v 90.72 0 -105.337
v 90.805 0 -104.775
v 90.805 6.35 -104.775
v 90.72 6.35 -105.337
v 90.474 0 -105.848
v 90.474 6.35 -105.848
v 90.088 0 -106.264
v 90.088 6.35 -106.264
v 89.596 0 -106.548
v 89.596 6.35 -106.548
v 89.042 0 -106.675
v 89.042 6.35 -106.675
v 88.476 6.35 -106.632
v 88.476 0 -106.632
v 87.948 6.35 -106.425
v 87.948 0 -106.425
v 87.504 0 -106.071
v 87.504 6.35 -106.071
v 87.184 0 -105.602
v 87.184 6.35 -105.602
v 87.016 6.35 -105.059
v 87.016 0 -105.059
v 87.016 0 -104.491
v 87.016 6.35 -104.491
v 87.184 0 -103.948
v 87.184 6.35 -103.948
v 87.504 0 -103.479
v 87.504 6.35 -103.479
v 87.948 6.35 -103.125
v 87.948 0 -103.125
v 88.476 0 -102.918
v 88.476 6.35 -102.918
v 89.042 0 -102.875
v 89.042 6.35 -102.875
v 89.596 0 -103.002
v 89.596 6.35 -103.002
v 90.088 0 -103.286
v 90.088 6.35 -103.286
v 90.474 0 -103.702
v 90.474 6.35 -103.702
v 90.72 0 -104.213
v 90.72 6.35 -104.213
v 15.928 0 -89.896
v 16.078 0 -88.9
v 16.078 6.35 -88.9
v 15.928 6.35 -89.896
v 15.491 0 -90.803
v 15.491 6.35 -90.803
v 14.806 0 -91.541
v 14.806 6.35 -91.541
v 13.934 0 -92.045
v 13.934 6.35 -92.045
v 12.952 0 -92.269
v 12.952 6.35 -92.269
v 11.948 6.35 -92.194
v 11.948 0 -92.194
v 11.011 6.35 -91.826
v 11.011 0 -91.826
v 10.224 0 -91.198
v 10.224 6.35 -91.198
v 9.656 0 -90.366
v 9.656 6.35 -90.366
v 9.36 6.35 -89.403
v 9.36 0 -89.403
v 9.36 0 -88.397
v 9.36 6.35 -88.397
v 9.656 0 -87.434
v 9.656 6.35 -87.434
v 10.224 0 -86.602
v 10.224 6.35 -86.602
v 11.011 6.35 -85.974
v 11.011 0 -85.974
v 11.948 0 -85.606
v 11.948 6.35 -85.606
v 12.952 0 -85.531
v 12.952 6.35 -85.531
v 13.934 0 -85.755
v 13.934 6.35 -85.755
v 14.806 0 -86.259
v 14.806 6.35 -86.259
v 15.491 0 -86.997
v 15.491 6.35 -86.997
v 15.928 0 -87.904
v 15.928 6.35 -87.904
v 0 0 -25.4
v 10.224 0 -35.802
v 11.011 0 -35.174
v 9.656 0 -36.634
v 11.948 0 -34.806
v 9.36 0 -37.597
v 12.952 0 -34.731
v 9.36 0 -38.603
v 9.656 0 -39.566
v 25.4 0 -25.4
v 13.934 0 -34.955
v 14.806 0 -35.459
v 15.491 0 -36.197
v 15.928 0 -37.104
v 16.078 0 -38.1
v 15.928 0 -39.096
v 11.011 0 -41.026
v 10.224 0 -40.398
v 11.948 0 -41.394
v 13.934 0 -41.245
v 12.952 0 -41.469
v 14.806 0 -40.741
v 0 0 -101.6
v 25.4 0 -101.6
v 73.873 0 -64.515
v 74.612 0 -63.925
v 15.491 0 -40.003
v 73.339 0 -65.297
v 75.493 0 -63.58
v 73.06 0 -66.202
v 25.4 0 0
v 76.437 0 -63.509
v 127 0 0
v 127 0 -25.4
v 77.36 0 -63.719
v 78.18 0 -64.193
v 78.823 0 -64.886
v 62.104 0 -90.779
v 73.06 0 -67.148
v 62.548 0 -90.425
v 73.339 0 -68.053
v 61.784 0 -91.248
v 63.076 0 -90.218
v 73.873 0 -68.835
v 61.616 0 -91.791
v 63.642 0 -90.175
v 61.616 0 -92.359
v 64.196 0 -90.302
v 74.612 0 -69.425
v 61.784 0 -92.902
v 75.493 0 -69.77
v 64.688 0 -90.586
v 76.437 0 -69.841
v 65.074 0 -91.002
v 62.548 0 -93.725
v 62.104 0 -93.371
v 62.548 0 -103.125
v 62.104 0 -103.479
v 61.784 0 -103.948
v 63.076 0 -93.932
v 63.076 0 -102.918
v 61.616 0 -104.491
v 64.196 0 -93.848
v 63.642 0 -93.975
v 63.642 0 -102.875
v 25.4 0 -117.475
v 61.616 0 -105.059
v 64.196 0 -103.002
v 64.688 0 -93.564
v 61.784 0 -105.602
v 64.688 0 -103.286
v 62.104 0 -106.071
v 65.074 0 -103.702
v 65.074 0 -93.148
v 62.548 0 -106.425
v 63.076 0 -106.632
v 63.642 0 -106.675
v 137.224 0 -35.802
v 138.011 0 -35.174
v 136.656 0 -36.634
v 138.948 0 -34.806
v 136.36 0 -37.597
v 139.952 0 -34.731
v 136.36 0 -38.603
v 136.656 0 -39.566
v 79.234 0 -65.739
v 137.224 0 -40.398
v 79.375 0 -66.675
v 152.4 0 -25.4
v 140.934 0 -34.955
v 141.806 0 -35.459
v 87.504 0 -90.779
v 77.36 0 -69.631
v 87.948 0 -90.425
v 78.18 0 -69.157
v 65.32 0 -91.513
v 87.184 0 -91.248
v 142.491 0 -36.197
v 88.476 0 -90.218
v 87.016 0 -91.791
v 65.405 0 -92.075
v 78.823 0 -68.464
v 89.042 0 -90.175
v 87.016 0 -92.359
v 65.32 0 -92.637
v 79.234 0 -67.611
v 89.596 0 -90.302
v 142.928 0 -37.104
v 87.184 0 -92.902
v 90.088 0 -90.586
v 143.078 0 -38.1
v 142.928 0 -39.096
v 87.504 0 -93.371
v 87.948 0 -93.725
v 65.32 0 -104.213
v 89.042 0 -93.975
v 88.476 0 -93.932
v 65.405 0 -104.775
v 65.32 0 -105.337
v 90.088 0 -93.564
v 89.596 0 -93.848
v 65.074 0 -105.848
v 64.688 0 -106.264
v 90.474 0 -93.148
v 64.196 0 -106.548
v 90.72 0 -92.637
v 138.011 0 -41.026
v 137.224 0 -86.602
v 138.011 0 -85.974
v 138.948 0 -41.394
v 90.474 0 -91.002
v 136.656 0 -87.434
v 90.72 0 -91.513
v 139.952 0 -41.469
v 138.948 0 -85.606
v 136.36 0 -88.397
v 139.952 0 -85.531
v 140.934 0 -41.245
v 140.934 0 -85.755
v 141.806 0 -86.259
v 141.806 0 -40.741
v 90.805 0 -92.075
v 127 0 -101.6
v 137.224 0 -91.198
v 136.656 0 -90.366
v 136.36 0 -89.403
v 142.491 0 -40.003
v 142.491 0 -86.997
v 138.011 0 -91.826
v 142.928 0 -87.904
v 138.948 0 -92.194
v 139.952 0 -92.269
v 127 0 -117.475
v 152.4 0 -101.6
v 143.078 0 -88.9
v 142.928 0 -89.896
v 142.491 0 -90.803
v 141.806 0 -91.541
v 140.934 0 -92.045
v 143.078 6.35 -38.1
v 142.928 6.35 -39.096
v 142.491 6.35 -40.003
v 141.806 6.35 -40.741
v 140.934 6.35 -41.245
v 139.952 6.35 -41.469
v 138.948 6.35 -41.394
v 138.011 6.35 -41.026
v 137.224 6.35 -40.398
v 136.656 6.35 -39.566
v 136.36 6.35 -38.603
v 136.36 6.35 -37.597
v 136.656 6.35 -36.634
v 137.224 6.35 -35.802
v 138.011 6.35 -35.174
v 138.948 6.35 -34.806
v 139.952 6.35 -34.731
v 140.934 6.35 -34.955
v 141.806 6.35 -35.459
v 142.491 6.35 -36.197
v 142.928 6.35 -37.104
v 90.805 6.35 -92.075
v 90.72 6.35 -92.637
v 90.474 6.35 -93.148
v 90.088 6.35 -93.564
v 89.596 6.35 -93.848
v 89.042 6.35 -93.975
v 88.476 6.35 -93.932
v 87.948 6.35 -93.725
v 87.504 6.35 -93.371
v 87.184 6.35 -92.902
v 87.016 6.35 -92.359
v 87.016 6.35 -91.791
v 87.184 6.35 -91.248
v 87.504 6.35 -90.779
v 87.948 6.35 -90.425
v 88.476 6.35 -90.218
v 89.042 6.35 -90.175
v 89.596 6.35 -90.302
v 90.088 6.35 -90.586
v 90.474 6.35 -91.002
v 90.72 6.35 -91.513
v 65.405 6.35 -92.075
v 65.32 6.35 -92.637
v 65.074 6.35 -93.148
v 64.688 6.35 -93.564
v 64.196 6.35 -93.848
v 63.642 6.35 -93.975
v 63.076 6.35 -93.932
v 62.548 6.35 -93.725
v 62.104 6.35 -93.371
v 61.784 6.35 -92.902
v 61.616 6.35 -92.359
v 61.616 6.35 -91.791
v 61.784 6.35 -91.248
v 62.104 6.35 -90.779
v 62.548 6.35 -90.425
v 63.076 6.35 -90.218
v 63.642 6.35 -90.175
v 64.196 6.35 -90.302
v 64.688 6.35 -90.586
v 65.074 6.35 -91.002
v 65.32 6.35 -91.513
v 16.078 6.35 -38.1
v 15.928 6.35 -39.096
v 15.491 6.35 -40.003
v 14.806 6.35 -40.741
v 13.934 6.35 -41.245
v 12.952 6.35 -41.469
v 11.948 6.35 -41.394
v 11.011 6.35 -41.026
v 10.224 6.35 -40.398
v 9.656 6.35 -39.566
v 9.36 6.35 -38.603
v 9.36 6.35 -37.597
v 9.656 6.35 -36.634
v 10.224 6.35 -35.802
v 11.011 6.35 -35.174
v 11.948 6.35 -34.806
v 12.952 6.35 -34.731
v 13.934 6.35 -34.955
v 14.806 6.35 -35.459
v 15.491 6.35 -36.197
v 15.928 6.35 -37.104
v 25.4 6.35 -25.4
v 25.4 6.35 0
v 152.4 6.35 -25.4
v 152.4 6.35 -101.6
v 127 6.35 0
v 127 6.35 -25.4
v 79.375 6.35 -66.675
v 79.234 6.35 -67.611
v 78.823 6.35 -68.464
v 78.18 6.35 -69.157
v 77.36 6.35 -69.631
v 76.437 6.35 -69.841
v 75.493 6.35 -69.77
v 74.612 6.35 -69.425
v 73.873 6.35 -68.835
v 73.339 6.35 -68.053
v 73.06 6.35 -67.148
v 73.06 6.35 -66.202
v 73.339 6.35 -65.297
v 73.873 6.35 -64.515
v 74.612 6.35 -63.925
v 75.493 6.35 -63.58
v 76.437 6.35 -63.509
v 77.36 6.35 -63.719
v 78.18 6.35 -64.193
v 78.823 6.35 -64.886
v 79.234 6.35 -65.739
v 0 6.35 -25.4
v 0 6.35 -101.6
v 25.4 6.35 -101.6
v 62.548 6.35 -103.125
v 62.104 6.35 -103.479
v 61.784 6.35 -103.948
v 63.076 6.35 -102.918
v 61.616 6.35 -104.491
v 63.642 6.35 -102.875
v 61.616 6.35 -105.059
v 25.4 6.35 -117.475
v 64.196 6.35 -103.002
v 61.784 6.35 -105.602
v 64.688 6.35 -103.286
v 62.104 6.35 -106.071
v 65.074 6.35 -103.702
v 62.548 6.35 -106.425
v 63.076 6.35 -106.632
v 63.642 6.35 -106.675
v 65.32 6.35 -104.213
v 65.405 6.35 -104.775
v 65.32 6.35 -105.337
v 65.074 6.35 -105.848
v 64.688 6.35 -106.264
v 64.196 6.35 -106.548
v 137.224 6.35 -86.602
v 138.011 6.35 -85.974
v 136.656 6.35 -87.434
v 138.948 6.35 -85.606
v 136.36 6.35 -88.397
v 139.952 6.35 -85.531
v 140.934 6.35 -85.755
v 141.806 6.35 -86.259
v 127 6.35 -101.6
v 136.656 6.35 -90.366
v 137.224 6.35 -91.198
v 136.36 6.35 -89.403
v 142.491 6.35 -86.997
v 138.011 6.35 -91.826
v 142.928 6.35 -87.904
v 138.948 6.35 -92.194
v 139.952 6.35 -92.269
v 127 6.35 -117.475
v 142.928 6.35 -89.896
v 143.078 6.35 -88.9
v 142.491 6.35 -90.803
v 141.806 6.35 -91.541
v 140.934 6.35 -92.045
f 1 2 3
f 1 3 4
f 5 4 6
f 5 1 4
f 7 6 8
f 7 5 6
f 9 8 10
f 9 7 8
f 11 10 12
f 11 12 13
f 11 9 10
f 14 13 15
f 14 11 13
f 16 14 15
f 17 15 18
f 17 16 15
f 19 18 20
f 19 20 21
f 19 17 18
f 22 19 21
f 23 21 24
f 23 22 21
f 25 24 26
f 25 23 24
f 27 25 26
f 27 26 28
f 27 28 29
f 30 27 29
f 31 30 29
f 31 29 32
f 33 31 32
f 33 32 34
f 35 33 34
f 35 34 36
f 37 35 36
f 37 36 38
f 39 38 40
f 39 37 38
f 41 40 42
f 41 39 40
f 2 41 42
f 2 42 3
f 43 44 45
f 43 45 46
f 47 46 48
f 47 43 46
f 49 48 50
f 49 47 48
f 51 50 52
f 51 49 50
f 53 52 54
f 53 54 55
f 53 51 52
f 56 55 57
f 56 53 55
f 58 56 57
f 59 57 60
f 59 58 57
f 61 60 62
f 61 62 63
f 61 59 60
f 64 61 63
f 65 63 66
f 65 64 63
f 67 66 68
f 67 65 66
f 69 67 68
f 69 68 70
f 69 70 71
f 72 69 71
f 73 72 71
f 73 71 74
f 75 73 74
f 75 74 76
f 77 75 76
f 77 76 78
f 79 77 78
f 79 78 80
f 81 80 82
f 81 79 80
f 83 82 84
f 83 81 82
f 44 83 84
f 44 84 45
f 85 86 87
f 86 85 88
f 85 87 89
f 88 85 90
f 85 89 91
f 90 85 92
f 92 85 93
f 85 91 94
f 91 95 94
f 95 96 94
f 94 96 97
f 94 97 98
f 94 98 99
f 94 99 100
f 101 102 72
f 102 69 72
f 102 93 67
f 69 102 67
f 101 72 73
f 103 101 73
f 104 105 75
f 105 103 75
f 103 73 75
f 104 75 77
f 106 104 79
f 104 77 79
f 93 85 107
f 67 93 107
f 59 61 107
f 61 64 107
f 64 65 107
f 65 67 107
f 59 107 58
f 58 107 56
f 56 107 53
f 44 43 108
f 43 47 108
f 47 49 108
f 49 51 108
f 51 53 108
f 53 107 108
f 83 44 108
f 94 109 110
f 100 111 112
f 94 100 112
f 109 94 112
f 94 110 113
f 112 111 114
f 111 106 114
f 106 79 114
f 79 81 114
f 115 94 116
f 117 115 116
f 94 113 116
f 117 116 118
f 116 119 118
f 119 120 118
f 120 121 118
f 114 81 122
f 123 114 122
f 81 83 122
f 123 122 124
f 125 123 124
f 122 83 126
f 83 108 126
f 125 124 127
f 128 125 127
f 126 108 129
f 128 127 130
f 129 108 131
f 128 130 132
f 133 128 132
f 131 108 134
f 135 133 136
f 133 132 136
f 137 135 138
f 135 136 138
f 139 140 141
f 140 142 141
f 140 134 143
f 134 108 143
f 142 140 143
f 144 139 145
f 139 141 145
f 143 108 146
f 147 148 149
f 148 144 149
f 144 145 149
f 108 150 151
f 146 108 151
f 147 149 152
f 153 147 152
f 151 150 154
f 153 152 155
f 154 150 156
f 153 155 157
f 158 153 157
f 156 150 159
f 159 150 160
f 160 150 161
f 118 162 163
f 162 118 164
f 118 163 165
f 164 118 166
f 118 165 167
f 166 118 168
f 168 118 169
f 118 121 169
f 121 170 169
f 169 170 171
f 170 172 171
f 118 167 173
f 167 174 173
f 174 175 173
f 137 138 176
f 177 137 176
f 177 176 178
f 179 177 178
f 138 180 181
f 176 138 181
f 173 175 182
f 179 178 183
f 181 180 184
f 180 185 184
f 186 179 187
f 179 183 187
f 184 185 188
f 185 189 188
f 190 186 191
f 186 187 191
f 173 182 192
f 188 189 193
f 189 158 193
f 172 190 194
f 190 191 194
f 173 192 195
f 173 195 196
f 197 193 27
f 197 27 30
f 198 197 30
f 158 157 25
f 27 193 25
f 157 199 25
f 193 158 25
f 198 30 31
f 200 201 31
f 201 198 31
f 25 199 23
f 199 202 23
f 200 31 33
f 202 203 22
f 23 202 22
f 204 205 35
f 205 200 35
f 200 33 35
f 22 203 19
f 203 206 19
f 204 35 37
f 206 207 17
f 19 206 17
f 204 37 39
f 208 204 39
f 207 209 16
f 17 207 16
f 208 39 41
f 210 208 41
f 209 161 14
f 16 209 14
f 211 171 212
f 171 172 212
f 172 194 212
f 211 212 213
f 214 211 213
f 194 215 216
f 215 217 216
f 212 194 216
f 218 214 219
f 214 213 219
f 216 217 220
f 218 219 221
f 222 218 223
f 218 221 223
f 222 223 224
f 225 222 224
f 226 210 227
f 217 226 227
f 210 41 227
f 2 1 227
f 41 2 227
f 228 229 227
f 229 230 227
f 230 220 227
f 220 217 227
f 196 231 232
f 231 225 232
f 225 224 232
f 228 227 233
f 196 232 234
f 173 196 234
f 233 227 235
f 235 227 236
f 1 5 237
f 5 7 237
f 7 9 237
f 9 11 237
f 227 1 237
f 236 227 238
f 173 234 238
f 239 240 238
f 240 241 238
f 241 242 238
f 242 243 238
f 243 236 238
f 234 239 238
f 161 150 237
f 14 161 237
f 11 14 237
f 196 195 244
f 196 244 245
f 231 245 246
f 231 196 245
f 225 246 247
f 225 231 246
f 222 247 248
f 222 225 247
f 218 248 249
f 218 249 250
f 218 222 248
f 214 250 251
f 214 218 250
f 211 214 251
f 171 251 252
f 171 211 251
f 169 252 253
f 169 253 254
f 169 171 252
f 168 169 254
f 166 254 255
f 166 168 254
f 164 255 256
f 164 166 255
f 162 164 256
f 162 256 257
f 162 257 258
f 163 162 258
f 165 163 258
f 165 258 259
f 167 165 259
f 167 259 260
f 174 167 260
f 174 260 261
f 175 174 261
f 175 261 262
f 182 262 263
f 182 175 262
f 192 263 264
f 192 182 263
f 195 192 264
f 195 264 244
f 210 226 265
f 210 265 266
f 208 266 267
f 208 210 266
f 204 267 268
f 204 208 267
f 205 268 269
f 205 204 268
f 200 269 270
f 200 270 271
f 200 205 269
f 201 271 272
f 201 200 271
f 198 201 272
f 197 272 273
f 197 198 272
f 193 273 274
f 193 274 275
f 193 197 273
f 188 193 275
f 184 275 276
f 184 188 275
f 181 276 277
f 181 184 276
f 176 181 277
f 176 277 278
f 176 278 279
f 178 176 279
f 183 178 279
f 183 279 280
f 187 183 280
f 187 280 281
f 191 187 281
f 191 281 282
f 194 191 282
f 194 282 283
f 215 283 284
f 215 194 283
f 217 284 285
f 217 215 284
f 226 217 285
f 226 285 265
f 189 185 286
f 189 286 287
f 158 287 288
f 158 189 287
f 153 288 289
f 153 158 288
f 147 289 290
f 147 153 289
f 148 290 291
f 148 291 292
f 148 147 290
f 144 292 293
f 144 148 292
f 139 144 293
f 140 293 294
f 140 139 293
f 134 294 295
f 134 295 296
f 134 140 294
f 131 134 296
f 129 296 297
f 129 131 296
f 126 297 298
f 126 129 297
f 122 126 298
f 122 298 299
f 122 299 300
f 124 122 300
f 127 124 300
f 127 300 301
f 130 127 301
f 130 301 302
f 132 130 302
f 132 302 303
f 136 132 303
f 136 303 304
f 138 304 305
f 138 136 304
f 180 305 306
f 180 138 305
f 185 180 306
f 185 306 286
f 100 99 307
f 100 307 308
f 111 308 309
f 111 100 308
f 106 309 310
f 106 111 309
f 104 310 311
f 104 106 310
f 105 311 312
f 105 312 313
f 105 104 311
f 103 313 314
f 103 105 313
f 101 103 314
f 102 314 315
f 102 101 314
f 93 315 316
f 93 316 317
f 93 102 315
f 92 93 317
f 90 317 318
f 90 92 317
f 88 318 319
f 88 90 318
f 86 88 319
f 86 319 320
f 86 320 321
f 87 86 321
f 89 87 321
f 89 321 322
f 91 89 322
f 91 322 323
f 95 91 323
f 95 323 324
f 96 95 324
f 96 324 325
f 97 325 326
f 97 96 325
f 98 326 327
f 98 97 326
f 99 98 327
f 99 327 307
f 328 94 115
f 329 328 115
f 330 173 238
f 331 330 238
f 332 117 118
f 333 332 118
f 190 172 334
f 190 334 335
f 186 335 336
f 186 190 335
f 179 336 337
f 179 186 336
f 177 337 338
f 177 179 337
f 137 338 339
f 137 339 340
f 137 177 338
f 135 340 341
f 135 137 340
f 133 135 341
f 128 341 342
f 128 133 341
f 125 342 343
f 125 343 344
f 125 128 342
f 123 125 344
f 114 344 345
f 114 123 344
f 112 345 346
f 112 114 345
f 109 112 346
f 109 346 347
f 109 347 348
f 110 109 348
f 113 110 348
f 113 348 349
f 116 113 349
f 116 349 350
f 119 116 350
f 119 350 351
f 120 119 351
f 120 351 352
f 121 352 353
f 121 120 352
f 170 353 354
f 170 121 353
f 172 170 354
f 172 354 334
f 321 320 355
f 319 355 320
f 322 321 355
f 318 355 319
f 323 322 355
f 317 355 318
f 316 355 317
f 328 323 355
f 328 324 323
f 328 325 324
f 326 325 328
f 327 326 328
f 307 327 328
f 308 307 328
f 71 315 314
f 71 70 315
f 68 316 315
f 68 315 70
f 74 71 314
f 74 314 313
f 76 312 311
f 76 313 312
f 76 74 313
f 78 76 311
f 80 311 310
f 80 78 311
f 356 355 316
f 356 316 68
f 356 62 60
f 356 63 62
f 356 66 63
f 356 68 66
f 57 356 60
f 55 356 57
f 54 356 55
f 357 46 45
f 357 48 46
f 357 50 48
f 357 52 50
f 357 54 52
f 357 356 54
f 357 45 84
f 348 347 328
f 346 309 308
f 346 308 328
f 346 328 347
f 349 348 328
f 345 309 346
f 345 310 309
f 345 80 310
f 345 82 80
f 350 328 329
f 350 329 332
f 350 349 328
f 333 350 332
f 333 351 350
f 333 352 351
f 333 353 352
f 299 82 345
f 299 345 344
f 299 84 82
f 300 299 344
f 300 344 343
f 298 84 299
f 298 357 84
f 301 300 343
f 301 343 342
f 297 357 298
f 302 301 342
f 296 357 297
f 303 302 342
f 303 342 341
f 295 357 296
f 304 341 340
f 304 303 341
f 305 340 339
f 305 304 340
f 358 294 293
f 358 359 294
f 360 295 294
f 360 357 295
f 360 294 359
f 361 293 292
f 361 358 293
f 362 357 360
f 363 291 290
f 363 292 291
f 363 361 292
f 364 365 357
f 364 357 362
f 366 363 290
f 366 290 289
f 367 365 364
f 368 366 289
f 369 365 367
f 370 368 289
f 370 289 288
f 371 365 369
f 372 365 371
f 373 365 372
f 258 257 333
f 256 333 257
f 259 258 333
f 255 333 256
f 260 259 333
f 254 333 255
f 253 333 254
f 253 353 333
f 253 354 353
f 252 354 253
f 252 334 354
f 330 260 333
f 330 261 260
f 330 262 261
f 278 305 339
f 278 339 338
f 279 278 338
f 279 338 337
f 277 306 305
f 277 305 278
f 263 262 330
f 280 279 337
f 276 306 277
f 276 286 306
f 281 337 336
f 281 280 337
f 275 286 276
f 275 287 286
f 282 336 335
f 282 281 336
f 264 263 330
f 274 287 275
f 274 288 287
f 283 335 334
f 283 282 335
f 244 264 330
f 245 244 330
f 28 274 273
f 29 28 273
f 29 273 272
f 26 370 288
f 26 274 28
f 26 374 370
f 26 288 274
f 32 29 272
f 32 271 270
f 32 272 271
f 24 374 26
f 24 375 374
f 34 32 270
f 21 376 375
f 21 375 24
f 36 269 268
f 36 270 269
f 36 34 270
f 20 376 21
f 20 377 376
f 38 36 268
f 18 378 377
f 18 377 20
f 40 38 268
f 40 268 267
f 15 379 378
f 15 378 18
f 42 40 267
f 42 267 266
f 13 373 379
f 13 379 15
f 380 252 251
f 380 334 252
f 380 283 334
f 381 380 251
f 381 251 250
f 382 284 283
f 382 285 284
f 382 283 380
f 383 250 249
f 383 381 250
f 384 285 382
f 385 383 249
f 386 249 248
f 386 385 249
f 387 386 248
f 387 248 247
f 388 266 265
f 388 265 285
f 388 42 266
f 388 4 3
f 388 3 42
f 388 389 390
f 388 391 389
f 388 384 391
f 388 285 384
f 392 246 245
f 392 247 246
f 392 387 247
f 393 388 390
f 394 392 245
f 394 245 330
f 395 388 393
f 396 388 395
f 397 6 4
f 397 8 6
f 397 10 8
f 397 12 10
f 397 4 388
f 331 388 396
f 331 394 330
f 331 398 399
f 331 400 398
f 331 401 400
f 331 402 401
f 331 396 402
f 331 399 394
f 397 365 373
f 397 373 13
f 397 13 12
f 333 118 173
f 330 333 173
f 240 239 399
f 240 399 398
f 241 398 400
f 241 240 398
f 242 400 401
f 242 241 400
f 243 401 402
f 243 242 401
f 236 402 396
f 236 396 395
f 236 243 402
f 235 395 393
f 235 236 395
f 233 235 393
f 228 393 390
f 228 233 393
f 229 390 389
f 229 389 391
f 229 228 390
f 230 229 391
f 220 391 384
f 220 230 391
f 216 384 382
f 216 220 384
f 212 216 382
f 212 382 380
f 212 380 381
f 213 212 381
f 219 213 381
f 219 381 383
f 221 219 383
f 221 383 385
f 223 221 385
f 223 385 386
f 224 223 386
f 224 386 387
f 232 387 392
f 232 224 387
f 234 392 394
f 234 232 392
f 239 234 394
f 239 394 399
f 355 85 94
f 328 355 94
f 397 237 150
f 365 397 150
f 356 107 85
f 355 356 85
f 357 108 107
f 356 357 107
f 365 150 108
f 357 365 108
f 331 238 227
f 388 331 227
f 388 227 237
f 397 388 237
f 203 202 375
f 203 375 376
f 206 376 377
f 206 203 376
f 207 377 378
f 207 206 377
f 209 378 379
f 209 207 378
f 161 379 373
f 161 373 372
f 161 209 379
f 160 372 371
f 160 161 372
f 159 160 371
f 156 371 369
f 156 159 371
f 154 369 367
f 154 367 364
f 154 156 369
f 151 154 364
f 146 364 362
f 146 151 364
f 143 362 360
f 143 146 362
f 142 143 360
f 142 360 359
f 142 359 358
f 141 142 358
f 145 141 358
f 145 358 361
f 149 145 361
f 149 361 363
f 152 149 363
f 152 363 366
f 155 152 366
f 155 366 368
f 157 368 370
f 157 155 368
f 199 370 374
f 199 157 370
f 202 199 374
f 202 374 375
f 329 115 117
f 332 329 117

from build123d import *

# Parameters (mm, degrees)
SKETCH1_R           = 3.3782
SKETCH1_R_2         = 1.905
SKETCH1_R_3         = 3.175
BOSS_EXTRUDE1_DEPTH = 6.35


with BuildPart() as part:
    # Sketch1 → Boss-Extrude1 (new body)
    with BuildSketch(Plane(origin=(0, 0, 0), x_dir=(1, 0, 0), z_dir=(0, 1, 0))):
        Polygon((25.4, 25.4), (25.4, 0), (127, 0), (127, 25.4), (152.4, 25.4), (152.4, 101.6), (127, 101.6), (127, 117.475), (25.4, 117.475), (25.4, 101.6), (0, 101.6), (0, 25.4), align=None)
        with Locations((12.7, 38.1)):
            Circle(SKETCH1_R, mode=Mode.SUBTRACT)
        with Locations((139.7, 38.1)):
            Circle(SKETCH1_R, mode=Mode.SUBTRACT)
        with Locations((12.7, 88.9)):
            Circle(SKETCH1_R, mode=Mode.SUBTRACT)
        with Locations((63.5, 92.075)):
            Circle(SKETCH1_R_2, mode=Mode.SUBTRACT)
        with Locations((63.5, 104.775)):
            Circle(SKETCH1_R_2, mode=Mode.SUBTRACT)
        with Locations((76.2, 66.675)):
            Circle(SKETCH1_R_3, mode=Mode.SUBTRACT)
        with Locations((88.9, 92.075)):
            Circle(SKETCH1_R_2, mode=Mode.SUBTRACT)
        with Locations((88.9, 104.775)):
            Circle(SKETCH1_R_2, mode=Mode.SUBTRACT)
        with Locations((139.7, 88.9)):
            Circle(SKETCH1_R, mode=Mode.SUBTRACT)
    extrude(amount=BOSS_EXTRUDE1_DEPTH)


solid = part.part
